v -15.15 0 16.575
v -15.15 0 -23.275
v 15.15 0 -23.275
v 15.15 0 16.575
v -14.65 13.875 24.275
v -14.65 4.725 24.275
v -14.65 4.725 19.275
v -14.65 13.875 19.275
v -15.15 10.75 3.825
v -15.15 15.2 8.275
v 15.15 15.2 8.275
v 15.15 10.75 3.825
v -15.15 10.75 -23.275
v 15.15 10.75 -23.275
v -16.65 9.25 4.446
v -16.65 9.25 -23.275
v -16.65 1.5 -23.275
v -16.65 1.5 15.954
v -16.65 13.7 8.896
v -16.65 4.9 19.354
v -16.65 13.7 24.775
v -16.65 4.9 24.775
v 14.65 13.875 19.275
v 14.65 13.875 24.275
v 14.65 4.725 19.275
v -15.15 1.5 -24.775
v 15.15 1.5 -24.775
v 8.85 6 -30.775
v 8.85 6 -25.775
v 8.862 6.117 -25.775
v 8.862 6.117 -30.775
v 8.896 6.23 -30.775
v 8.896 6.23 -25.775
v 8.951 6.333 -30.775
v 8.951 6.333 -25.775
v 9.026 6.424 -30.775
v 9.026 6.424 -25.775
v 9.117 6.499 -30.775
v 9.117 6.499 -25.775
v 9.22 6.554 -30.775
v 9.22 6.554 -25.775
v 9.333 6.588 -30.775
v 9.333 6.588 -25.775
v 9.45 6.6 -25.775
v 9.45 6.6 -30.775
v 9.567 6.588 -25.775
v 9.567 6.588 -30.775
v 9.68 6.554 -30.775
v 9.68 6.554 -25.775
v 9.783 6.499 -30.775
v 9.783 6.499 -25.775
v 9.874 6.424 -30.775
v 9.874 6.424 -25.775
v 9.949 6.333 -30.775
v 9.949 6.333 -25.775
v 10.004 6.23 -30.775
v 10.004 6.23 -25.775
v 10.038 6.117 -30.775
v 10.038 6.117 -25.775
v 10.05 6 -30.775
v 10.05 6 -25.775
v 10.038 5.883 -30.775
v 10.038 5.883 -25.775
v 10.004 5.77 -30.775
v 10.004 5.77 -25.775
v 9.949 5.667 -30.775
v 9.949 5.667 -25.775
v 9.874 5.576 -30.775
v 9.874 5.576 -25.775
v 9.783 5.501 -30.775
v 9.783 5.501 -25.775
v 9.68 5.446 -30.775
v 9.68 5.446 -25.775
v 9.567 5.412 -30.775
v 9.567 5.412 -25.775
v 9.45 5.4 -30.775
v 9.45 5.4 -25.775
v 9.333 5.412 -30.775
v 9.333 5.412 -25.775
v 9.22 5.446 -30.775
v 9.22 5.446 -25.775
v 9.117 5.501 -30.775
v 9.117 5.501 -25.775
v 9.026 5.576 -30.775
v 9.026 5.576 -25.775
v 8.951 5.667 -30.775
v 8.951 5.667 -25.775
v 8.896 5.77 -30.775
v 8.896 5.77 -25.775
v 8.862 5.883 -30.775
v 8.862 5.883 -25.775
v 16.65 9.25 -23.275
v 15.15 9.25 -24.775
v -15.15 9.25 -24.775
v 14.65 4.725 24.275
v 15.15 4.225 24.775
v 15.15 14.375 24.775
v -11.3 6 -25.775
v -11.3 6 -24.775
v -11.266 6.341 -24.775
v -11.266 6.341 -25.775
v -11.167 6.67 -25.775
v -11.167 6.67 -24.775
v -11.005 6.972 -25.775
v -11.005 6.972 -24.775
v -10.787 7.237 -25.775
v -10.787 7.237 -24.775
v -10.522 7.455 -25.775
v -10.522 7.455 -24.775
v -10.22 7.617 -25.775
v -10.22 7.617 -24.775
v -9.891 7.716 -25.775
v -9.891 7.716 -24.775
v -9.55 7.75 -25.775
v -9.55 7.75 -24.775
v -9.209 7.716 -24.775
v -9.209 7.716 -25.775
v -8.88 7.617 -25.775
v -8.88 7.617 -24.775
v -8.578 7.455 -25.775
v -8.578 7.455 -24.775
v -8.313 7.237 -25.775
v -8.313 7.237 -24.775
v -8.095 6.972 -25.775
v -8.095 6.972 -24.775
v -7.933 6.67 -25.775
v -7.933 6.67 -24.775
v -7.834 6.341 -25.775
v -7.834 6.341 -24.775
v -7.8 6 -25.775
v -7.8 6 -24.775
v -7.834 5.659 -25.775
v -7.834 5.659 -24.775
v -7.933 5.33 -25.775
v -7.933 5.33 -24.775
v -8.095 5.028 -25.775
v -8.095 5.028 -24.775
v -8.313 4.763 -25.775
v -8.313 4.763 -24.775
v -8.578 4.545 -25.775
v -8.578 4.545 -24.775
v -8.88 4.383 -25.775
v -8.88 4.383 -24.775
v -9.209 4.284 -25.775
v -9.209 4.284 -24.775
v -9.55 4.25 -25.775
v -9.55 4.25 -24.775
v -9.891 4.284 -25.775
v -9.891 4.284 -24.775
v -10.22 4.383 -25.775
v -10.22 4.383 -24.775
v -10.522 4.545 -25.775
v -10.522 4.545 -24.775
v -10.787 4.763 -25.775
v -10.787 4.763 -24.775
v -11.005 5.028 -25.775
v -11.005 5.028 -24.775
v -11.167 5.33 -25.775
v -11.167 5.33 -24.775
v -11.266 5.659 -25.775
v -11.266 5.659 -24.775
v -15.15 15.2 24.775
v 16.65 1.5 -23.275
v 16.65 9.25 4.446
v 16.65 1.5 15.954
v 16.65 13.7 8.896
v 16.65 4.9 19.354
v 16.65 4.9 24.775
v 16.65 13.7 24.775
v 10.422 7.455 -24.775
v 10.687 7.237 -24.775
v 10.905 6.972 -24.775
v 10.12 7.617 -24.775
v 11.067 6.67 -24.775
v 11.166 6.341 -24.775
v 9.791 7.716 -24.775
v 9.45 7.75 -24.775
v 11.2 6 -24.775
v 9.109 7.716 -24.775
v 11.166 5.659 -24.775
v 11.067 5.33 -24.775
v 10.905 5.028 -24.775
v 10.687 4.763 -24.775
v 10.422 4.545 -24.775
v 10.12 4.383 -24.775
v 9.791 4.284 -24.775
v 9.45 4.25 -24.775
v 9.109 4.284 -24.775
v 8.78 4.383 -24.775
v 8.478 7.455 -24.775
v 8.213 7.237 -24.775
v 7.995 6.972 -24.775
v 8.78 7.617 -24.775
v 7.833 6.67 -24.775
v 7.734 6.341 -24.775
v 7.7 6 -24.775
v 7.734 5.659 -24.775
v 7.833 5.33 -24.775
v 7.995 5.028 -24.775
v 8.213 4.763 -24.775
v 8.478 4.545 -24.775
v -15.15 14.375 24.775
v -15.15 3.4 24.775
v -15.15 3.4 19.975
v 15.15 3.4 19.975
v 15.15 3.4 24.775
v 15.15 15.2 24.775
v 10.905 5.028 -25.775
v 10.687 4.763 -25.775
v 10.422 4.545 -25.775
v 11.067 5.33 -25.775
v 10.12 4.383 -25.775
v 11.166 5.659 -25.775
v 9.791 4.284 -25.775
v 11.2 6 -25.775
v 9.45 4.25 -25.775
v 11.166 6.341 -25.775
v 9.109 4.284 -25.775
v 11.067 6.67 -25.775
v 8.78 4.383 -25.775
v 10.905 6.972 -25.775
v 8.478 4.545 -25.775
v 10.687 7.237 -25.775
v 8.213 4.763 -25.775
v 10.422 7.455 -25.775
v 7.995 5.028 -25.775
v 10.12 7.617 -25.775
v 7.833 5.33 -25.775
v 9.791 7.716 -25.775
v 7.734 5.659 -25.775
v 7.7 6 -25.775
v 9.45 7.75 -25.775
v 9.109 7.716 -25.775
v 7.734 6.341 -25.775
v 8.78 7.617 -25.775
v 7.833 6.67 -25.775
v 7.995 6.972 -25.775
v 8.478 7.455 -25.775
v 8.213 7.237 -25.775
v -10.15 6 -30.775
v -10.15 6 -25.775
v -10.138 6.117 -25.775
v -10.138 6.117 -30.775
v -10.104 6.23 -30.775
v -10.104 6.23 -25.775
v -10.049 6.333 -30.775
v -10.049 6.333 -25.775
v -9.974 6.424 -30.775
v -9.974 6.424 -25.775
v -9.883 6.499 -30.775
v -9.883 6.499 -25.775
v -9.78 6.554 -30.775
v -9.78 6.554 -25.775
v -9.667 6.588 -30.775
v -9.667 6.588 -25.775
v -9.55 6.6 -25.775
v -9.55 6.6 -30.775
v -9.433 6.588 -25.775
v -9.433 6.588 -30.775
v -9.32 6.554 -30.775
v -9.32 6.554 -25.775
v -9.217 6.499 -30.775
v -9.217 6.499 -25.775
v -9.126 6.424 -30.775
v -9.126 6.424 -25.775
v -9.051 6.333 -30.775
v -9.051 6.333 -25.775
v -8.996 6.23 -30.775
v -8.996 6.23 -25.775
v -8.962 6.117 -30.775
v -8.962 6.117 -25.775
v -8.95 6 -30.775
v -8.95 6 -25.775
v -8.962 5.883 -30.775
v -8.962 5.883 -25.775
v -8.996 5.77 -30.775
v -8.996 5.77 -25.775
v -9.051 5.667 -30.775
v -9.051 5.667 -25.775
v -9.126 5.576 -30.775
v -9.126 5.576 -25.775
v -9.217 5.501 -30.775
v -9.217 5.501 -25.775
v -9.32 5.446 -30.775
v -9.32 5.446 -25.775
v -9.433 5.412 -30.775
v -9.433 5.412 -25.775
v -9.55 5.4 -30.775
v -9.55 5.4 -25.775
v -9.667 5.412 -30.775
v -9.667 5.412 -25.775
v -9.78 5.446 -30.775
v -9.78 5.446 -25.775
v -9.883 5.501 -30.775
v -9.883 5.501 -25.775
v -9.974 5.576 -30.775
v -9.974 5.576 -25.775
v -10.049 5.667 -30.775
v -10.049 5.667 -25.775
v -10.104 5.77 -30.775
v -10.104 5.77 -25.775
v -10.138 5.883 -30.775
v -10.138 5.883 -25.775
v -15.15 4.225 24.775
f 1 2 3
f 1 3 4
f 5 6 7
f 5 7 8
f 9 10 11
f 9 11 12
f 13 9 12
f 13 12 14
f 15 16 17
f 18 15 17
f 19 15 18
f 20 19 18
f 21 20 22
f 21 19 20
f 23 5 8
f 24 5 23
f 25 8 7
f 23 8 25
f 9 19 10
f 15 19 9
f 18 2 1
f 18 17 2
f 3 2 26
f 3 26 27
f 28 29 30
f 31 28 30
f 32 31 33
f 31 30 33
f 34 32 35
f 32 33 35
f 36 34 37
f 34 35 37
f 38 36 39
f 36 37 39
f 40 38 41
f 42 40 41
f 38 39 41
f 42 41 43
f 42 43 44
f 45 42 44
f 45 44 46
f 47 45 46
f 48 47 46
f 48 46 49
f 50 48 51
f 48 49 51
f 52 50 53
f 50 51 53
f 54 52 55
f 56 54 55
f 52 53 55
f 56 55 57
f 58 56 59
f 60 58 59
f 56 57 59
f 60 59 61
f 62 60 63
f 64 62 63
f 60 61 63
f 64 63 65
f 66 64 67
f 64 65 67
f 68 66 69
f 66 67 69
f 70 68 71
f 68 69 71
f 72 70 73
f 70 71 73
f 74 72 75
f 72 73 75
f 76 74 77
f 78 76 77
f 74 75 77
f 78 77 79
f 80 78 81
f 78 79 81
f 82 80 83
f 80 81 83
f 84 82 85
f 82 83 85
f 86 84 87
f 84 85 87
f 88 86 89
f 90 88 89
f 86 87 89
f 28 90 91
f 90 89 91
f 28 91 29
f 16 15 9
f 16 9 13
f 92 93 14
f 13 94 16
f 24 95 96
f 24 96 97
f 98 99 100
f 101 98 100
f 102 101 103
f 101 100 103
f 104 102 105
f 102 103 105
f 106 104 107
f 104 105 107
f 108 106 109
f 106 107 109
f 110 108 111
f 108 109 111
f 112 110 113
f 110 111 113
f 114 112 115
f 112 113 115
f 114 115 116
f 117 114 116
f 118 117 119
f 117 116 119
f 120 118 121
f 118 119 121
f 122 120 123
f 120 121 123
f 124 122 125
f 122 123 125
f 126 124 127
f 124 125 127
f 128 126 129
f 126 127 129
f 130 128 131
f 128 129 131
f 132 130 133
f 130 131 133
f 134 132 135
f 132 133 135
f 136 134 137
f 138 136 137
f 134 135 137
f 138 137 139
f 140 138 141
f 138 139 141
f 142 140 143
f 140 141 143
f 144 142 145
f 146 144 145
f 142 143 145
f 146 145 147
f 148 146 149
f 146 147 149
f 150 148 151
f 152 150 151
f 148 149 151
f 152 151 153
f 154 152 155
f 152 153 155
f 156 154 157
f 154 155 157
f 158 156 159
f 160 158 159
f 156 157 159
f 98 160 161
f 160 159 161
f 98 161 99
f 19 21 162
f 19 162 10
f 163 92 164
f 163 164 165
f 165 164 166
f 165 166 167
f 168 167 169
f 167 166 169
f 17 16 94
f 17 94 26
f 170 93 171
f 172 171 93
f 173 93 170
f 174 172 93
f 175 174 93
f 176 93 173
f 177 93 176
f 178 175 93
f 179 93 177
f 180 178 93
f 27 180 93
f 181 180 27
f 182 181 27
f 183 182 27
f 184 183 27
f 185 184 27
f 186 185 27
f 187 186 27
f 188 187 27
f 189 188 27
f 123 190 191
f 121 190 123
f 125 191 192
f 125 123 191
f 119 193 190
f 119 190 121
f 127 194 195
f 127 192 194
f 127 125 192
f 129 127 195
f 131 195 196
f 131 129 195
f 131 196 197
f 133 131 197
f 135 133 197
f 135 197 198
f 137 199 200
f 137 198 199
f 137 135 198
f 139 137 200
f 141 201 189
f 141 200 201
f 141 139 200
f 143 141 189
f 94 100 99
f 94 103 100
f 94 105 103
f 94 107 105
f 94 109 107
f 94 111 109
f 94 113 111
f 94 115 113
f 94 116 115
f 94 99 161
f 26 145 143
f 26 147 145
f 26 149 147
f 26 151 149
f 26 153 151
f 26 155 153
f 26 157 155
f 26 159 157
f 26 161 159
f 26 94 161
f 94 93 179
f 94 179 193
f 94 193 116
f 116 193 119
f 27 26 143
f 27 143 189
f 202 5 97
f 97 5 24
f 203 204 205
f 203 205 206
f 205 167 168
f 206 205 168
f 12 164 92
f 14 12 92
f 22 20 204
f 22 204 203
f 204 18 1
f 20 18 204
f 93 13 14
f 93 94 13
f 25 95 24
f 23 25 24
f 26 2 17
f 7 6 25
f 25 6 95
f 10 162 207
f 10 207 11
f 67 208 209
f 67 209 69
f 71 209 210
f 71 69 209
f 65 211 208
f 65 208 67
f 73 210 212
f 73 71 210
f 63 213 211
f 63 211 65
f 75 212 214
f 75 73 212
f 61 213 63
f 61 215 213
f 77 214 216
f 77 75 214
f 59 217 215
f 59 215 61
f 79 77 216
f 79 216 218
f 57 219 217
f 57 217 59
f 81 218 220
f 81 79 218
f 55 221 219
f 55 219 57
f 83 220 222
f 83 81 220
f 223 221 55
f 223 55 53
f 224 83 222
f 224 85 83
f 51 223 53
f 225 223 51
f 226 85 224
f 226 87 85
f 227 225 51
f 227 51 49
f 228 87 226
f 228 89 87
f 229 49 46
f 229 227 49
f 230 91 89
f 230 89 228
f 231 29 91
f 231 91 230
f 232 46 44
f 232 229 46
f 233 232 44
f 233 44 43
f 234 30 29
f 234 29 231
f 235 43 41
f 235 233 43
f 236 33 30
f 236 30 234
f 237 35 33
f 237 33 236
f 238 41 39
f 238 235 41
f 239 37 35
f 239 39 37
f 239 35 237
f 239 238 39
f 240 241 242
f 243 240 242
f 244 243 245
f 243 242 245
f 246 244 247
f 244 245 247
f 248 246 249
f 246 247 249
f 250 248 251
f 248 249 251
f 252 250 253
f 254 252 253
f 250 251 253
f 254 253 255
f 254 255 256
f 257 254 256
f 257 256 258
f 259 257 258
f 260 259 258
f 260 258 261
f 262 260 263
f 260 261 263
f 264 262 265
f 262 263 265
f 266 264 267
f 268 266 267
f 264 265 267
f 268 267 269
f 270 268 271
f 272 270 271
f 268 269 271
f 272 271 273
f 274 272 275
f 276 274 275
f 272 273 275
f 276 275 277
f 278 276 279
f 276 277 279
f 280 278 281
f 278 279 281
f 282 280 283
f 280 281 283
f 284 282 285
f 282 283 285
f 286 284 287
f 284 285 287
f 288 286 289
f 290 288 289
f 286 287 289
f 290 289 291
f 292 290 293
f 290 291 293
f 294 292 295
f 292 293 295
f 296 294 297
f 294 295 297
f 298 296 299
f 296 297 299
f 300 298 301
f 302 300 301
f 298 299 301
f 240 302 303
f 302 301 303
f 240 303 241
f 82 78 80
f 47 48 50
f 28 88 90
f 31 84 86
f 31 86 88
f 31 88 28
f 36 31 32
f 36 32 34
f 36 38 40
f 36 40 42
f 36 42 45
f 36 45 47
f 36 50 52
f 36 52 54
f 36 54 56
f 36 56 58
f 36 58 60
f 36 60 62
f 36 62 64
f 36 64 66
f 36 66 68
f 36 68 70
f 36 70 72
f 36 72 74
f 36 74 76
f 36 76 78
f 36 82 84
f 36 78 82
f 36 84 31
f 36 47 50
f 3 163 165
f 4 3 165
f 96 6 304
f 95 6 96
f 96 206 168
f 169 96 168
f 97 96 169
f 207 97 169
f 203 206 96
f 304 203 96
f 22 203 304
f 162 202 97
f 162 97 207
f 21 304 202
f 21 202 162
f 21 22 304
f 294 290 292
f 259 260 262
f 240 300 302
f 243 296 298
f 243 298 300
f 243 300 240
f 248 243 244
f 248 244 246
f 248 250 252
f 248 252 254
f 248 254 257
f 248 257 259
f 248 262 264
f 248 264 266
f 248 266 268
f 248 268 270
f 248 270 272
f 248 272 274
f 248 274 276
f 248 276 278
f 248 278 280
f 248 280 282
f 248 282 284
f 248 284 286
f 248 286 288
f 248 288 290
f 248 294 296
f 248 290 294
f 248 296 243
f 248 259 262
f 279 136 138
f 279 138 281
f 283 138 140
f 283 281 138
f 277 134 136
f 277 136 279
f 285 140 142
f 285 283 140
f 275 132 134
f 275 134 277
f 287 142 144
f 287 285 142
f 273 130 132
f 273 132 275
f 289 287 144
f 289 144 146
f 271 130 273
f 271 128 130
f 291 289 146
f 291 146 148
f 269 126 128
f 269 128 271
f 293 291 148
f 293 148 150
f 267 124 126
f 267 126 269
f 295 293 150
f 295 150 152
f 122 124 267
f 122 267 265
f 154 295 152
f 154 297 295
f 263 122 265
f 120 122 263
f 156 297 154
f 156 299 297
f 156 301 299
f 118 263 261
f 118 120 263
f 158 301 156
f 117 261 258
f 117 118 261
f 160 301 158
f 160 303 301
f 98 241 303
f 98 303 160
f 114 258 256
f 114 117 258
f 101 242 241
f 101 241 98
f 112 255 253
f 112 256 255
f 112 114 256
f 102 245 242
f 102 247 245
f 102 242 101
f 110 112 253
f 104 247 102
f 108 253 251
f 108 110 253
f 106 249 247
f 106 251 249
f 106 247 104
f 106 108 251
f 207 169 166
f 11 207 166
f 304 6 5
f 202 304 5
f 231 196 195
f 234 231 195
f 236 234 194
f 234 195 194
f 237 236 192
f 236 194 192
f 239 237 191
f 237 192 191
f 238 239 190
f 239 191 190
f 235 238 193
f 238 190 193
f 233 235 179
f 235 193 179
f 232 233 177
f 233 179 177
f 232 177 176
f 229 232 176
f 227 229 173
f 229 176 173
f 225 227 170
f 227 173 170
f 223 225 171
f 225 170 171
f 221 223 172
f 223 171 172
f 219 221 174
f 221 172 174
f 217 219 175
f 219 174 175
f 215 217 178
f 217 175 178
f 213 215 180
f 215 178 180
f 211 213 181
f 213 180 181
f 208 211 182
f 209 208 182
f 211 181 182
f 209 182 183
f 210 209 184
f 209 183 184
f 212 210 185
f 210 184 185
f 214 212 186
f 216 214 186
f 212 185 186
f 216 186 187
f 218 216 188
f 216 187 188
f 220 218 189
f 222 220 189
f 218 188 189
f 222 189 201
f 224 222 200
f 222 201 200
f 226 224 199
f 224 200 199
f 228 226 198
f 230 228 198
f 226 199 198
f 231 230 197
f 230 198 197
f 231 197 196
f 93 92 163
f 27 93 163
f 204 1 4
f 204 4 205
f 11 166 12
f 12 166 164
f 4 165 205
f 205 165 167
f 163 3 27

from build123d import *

# Parameters (mm, degrees)
BOSS_EXTRUDE1_DEPTH      = 16.65
BOSS_EXTRUDE1_DEPTH_BACK = 16.65
CHAMFER1_SIZE            = 1.5
SKETCH2_R                = 1.75
BOSS_EXTRUDE2_DEPTH      = 1
SKETCH3_R                = 0.6
BOSS_EXTRUDE3_DEPTH      = 5
SKETCH4_W                = 29.3
SKETCH4_H                = 9.15
CUT_EXTRUDE1_DEPTH       = 5.5
CHAMFER2_SIZE            = 0.5


with BuildPart() as part:
    # Sketch1 → Boss-Extrude1 (new, two sides: drawn at the far end of the back side and taken through both)
    with BuildSketch(Plane(origin=(0, 0, 0), x_dir=(0, 0, -1), z_dir=(1, 0, 0)).offset(-BOSS_EXTRUDE1_DEPTH_BACK)):
        Polygon((-24.775, 15.2), (-8.275, 15.2), (-3.825, 10.75), (24.775, 10.75), (24.775, 0), (-16.575, 0), (-19.975, 3.4), (-24.775, 3.4), align=None)
    extrude(amount=BOSS_EXTRUDE1_DEPTH + BOSS_EXTRUDE1_DEPTH_BACK)

    # Chamfer1
    chamfer1_edges = [part.edges().sort_by_distance(p)[0] for p in [
        (-16.65, 1.7, 18.275),
        (-16.65, 0, -4.1),
        (0, 10.75, -24.775),
        (0, 0, -24.775),
        (-16.65, 5.375, -24.775),
        (-16.65, 10.75, -10.475),
        (-16.65, 12.975, 6.05),
        (16.65, 3.4, 22.375),
        (16.65, 1.7, 18.275),
        (16.65, 0, -4.1),
        (16.65, 5.375, -24.775),
        (16.65, 10.75, -10.475),
        (16.65, 12.975, 6.05),
        (16.65, 15.2, 16.525),
        (-16.65, 15.2, 16.525),
        (-16.65, 3.4, 22.375),
    ]]
    chamfer(chamfer1_edges, length=CHAMFER1_SIZE)

    # Sketch2 → Boss-Extrude2 (add)
    with BuildSketch(Plane(origin=(0, 0, -24.775), x_dir=(-1, 0, 0), z_dir=(0, 0, -1))):
        with Locations((-9.45, 6)):
            Circle(SKETCH2_R)
        with Locations((9.55, 6)):
            Circle(SKETCH2_R)
    extrude(amount=BOSS_EXTRUDE2_DEPTH)

    # Sketch3 → Boss-Extrude3 (add)
    with BuildSketch(Plane(origin=(0, 0, -25.775), x_dir=(-1, 0, 0), z_dir=(0, 0, -1))):
        with Locations((-9.45, 6)):
            Circle(SKETCH3_R)
        with Locations((9.55, 6)):
            Circle(SKETCH3_R)
    extrude(amount=BOSS_EXTRUDE3_DEPTH)

    # Sketch4 → Cut-Extrude1 (cut)
    with BuildSketch(Plane.XY.offset(24.775)):
        with Locations((0, 9.3)):
            Rectangle(SKETCH4_W, SKETCH4_H)
    extrude(amount=-CUT_EXTRUDE1_DEPTH, mode=Mode.SUBTRACT)

    # Chamfer2
    chamfer2_edges = [part.edges().sort_by_distance(p)[0] for p in [
        (-14.65, 9.3, 24.775),
        (0, 4.725, 24.775),
        (14.65, 9.3, 24.775),
        (0, 13.875, 24.775),
    ]]
    chamfer(chamfer2_edges, length=CHAMFER2_SIZE)


solid = part.part
